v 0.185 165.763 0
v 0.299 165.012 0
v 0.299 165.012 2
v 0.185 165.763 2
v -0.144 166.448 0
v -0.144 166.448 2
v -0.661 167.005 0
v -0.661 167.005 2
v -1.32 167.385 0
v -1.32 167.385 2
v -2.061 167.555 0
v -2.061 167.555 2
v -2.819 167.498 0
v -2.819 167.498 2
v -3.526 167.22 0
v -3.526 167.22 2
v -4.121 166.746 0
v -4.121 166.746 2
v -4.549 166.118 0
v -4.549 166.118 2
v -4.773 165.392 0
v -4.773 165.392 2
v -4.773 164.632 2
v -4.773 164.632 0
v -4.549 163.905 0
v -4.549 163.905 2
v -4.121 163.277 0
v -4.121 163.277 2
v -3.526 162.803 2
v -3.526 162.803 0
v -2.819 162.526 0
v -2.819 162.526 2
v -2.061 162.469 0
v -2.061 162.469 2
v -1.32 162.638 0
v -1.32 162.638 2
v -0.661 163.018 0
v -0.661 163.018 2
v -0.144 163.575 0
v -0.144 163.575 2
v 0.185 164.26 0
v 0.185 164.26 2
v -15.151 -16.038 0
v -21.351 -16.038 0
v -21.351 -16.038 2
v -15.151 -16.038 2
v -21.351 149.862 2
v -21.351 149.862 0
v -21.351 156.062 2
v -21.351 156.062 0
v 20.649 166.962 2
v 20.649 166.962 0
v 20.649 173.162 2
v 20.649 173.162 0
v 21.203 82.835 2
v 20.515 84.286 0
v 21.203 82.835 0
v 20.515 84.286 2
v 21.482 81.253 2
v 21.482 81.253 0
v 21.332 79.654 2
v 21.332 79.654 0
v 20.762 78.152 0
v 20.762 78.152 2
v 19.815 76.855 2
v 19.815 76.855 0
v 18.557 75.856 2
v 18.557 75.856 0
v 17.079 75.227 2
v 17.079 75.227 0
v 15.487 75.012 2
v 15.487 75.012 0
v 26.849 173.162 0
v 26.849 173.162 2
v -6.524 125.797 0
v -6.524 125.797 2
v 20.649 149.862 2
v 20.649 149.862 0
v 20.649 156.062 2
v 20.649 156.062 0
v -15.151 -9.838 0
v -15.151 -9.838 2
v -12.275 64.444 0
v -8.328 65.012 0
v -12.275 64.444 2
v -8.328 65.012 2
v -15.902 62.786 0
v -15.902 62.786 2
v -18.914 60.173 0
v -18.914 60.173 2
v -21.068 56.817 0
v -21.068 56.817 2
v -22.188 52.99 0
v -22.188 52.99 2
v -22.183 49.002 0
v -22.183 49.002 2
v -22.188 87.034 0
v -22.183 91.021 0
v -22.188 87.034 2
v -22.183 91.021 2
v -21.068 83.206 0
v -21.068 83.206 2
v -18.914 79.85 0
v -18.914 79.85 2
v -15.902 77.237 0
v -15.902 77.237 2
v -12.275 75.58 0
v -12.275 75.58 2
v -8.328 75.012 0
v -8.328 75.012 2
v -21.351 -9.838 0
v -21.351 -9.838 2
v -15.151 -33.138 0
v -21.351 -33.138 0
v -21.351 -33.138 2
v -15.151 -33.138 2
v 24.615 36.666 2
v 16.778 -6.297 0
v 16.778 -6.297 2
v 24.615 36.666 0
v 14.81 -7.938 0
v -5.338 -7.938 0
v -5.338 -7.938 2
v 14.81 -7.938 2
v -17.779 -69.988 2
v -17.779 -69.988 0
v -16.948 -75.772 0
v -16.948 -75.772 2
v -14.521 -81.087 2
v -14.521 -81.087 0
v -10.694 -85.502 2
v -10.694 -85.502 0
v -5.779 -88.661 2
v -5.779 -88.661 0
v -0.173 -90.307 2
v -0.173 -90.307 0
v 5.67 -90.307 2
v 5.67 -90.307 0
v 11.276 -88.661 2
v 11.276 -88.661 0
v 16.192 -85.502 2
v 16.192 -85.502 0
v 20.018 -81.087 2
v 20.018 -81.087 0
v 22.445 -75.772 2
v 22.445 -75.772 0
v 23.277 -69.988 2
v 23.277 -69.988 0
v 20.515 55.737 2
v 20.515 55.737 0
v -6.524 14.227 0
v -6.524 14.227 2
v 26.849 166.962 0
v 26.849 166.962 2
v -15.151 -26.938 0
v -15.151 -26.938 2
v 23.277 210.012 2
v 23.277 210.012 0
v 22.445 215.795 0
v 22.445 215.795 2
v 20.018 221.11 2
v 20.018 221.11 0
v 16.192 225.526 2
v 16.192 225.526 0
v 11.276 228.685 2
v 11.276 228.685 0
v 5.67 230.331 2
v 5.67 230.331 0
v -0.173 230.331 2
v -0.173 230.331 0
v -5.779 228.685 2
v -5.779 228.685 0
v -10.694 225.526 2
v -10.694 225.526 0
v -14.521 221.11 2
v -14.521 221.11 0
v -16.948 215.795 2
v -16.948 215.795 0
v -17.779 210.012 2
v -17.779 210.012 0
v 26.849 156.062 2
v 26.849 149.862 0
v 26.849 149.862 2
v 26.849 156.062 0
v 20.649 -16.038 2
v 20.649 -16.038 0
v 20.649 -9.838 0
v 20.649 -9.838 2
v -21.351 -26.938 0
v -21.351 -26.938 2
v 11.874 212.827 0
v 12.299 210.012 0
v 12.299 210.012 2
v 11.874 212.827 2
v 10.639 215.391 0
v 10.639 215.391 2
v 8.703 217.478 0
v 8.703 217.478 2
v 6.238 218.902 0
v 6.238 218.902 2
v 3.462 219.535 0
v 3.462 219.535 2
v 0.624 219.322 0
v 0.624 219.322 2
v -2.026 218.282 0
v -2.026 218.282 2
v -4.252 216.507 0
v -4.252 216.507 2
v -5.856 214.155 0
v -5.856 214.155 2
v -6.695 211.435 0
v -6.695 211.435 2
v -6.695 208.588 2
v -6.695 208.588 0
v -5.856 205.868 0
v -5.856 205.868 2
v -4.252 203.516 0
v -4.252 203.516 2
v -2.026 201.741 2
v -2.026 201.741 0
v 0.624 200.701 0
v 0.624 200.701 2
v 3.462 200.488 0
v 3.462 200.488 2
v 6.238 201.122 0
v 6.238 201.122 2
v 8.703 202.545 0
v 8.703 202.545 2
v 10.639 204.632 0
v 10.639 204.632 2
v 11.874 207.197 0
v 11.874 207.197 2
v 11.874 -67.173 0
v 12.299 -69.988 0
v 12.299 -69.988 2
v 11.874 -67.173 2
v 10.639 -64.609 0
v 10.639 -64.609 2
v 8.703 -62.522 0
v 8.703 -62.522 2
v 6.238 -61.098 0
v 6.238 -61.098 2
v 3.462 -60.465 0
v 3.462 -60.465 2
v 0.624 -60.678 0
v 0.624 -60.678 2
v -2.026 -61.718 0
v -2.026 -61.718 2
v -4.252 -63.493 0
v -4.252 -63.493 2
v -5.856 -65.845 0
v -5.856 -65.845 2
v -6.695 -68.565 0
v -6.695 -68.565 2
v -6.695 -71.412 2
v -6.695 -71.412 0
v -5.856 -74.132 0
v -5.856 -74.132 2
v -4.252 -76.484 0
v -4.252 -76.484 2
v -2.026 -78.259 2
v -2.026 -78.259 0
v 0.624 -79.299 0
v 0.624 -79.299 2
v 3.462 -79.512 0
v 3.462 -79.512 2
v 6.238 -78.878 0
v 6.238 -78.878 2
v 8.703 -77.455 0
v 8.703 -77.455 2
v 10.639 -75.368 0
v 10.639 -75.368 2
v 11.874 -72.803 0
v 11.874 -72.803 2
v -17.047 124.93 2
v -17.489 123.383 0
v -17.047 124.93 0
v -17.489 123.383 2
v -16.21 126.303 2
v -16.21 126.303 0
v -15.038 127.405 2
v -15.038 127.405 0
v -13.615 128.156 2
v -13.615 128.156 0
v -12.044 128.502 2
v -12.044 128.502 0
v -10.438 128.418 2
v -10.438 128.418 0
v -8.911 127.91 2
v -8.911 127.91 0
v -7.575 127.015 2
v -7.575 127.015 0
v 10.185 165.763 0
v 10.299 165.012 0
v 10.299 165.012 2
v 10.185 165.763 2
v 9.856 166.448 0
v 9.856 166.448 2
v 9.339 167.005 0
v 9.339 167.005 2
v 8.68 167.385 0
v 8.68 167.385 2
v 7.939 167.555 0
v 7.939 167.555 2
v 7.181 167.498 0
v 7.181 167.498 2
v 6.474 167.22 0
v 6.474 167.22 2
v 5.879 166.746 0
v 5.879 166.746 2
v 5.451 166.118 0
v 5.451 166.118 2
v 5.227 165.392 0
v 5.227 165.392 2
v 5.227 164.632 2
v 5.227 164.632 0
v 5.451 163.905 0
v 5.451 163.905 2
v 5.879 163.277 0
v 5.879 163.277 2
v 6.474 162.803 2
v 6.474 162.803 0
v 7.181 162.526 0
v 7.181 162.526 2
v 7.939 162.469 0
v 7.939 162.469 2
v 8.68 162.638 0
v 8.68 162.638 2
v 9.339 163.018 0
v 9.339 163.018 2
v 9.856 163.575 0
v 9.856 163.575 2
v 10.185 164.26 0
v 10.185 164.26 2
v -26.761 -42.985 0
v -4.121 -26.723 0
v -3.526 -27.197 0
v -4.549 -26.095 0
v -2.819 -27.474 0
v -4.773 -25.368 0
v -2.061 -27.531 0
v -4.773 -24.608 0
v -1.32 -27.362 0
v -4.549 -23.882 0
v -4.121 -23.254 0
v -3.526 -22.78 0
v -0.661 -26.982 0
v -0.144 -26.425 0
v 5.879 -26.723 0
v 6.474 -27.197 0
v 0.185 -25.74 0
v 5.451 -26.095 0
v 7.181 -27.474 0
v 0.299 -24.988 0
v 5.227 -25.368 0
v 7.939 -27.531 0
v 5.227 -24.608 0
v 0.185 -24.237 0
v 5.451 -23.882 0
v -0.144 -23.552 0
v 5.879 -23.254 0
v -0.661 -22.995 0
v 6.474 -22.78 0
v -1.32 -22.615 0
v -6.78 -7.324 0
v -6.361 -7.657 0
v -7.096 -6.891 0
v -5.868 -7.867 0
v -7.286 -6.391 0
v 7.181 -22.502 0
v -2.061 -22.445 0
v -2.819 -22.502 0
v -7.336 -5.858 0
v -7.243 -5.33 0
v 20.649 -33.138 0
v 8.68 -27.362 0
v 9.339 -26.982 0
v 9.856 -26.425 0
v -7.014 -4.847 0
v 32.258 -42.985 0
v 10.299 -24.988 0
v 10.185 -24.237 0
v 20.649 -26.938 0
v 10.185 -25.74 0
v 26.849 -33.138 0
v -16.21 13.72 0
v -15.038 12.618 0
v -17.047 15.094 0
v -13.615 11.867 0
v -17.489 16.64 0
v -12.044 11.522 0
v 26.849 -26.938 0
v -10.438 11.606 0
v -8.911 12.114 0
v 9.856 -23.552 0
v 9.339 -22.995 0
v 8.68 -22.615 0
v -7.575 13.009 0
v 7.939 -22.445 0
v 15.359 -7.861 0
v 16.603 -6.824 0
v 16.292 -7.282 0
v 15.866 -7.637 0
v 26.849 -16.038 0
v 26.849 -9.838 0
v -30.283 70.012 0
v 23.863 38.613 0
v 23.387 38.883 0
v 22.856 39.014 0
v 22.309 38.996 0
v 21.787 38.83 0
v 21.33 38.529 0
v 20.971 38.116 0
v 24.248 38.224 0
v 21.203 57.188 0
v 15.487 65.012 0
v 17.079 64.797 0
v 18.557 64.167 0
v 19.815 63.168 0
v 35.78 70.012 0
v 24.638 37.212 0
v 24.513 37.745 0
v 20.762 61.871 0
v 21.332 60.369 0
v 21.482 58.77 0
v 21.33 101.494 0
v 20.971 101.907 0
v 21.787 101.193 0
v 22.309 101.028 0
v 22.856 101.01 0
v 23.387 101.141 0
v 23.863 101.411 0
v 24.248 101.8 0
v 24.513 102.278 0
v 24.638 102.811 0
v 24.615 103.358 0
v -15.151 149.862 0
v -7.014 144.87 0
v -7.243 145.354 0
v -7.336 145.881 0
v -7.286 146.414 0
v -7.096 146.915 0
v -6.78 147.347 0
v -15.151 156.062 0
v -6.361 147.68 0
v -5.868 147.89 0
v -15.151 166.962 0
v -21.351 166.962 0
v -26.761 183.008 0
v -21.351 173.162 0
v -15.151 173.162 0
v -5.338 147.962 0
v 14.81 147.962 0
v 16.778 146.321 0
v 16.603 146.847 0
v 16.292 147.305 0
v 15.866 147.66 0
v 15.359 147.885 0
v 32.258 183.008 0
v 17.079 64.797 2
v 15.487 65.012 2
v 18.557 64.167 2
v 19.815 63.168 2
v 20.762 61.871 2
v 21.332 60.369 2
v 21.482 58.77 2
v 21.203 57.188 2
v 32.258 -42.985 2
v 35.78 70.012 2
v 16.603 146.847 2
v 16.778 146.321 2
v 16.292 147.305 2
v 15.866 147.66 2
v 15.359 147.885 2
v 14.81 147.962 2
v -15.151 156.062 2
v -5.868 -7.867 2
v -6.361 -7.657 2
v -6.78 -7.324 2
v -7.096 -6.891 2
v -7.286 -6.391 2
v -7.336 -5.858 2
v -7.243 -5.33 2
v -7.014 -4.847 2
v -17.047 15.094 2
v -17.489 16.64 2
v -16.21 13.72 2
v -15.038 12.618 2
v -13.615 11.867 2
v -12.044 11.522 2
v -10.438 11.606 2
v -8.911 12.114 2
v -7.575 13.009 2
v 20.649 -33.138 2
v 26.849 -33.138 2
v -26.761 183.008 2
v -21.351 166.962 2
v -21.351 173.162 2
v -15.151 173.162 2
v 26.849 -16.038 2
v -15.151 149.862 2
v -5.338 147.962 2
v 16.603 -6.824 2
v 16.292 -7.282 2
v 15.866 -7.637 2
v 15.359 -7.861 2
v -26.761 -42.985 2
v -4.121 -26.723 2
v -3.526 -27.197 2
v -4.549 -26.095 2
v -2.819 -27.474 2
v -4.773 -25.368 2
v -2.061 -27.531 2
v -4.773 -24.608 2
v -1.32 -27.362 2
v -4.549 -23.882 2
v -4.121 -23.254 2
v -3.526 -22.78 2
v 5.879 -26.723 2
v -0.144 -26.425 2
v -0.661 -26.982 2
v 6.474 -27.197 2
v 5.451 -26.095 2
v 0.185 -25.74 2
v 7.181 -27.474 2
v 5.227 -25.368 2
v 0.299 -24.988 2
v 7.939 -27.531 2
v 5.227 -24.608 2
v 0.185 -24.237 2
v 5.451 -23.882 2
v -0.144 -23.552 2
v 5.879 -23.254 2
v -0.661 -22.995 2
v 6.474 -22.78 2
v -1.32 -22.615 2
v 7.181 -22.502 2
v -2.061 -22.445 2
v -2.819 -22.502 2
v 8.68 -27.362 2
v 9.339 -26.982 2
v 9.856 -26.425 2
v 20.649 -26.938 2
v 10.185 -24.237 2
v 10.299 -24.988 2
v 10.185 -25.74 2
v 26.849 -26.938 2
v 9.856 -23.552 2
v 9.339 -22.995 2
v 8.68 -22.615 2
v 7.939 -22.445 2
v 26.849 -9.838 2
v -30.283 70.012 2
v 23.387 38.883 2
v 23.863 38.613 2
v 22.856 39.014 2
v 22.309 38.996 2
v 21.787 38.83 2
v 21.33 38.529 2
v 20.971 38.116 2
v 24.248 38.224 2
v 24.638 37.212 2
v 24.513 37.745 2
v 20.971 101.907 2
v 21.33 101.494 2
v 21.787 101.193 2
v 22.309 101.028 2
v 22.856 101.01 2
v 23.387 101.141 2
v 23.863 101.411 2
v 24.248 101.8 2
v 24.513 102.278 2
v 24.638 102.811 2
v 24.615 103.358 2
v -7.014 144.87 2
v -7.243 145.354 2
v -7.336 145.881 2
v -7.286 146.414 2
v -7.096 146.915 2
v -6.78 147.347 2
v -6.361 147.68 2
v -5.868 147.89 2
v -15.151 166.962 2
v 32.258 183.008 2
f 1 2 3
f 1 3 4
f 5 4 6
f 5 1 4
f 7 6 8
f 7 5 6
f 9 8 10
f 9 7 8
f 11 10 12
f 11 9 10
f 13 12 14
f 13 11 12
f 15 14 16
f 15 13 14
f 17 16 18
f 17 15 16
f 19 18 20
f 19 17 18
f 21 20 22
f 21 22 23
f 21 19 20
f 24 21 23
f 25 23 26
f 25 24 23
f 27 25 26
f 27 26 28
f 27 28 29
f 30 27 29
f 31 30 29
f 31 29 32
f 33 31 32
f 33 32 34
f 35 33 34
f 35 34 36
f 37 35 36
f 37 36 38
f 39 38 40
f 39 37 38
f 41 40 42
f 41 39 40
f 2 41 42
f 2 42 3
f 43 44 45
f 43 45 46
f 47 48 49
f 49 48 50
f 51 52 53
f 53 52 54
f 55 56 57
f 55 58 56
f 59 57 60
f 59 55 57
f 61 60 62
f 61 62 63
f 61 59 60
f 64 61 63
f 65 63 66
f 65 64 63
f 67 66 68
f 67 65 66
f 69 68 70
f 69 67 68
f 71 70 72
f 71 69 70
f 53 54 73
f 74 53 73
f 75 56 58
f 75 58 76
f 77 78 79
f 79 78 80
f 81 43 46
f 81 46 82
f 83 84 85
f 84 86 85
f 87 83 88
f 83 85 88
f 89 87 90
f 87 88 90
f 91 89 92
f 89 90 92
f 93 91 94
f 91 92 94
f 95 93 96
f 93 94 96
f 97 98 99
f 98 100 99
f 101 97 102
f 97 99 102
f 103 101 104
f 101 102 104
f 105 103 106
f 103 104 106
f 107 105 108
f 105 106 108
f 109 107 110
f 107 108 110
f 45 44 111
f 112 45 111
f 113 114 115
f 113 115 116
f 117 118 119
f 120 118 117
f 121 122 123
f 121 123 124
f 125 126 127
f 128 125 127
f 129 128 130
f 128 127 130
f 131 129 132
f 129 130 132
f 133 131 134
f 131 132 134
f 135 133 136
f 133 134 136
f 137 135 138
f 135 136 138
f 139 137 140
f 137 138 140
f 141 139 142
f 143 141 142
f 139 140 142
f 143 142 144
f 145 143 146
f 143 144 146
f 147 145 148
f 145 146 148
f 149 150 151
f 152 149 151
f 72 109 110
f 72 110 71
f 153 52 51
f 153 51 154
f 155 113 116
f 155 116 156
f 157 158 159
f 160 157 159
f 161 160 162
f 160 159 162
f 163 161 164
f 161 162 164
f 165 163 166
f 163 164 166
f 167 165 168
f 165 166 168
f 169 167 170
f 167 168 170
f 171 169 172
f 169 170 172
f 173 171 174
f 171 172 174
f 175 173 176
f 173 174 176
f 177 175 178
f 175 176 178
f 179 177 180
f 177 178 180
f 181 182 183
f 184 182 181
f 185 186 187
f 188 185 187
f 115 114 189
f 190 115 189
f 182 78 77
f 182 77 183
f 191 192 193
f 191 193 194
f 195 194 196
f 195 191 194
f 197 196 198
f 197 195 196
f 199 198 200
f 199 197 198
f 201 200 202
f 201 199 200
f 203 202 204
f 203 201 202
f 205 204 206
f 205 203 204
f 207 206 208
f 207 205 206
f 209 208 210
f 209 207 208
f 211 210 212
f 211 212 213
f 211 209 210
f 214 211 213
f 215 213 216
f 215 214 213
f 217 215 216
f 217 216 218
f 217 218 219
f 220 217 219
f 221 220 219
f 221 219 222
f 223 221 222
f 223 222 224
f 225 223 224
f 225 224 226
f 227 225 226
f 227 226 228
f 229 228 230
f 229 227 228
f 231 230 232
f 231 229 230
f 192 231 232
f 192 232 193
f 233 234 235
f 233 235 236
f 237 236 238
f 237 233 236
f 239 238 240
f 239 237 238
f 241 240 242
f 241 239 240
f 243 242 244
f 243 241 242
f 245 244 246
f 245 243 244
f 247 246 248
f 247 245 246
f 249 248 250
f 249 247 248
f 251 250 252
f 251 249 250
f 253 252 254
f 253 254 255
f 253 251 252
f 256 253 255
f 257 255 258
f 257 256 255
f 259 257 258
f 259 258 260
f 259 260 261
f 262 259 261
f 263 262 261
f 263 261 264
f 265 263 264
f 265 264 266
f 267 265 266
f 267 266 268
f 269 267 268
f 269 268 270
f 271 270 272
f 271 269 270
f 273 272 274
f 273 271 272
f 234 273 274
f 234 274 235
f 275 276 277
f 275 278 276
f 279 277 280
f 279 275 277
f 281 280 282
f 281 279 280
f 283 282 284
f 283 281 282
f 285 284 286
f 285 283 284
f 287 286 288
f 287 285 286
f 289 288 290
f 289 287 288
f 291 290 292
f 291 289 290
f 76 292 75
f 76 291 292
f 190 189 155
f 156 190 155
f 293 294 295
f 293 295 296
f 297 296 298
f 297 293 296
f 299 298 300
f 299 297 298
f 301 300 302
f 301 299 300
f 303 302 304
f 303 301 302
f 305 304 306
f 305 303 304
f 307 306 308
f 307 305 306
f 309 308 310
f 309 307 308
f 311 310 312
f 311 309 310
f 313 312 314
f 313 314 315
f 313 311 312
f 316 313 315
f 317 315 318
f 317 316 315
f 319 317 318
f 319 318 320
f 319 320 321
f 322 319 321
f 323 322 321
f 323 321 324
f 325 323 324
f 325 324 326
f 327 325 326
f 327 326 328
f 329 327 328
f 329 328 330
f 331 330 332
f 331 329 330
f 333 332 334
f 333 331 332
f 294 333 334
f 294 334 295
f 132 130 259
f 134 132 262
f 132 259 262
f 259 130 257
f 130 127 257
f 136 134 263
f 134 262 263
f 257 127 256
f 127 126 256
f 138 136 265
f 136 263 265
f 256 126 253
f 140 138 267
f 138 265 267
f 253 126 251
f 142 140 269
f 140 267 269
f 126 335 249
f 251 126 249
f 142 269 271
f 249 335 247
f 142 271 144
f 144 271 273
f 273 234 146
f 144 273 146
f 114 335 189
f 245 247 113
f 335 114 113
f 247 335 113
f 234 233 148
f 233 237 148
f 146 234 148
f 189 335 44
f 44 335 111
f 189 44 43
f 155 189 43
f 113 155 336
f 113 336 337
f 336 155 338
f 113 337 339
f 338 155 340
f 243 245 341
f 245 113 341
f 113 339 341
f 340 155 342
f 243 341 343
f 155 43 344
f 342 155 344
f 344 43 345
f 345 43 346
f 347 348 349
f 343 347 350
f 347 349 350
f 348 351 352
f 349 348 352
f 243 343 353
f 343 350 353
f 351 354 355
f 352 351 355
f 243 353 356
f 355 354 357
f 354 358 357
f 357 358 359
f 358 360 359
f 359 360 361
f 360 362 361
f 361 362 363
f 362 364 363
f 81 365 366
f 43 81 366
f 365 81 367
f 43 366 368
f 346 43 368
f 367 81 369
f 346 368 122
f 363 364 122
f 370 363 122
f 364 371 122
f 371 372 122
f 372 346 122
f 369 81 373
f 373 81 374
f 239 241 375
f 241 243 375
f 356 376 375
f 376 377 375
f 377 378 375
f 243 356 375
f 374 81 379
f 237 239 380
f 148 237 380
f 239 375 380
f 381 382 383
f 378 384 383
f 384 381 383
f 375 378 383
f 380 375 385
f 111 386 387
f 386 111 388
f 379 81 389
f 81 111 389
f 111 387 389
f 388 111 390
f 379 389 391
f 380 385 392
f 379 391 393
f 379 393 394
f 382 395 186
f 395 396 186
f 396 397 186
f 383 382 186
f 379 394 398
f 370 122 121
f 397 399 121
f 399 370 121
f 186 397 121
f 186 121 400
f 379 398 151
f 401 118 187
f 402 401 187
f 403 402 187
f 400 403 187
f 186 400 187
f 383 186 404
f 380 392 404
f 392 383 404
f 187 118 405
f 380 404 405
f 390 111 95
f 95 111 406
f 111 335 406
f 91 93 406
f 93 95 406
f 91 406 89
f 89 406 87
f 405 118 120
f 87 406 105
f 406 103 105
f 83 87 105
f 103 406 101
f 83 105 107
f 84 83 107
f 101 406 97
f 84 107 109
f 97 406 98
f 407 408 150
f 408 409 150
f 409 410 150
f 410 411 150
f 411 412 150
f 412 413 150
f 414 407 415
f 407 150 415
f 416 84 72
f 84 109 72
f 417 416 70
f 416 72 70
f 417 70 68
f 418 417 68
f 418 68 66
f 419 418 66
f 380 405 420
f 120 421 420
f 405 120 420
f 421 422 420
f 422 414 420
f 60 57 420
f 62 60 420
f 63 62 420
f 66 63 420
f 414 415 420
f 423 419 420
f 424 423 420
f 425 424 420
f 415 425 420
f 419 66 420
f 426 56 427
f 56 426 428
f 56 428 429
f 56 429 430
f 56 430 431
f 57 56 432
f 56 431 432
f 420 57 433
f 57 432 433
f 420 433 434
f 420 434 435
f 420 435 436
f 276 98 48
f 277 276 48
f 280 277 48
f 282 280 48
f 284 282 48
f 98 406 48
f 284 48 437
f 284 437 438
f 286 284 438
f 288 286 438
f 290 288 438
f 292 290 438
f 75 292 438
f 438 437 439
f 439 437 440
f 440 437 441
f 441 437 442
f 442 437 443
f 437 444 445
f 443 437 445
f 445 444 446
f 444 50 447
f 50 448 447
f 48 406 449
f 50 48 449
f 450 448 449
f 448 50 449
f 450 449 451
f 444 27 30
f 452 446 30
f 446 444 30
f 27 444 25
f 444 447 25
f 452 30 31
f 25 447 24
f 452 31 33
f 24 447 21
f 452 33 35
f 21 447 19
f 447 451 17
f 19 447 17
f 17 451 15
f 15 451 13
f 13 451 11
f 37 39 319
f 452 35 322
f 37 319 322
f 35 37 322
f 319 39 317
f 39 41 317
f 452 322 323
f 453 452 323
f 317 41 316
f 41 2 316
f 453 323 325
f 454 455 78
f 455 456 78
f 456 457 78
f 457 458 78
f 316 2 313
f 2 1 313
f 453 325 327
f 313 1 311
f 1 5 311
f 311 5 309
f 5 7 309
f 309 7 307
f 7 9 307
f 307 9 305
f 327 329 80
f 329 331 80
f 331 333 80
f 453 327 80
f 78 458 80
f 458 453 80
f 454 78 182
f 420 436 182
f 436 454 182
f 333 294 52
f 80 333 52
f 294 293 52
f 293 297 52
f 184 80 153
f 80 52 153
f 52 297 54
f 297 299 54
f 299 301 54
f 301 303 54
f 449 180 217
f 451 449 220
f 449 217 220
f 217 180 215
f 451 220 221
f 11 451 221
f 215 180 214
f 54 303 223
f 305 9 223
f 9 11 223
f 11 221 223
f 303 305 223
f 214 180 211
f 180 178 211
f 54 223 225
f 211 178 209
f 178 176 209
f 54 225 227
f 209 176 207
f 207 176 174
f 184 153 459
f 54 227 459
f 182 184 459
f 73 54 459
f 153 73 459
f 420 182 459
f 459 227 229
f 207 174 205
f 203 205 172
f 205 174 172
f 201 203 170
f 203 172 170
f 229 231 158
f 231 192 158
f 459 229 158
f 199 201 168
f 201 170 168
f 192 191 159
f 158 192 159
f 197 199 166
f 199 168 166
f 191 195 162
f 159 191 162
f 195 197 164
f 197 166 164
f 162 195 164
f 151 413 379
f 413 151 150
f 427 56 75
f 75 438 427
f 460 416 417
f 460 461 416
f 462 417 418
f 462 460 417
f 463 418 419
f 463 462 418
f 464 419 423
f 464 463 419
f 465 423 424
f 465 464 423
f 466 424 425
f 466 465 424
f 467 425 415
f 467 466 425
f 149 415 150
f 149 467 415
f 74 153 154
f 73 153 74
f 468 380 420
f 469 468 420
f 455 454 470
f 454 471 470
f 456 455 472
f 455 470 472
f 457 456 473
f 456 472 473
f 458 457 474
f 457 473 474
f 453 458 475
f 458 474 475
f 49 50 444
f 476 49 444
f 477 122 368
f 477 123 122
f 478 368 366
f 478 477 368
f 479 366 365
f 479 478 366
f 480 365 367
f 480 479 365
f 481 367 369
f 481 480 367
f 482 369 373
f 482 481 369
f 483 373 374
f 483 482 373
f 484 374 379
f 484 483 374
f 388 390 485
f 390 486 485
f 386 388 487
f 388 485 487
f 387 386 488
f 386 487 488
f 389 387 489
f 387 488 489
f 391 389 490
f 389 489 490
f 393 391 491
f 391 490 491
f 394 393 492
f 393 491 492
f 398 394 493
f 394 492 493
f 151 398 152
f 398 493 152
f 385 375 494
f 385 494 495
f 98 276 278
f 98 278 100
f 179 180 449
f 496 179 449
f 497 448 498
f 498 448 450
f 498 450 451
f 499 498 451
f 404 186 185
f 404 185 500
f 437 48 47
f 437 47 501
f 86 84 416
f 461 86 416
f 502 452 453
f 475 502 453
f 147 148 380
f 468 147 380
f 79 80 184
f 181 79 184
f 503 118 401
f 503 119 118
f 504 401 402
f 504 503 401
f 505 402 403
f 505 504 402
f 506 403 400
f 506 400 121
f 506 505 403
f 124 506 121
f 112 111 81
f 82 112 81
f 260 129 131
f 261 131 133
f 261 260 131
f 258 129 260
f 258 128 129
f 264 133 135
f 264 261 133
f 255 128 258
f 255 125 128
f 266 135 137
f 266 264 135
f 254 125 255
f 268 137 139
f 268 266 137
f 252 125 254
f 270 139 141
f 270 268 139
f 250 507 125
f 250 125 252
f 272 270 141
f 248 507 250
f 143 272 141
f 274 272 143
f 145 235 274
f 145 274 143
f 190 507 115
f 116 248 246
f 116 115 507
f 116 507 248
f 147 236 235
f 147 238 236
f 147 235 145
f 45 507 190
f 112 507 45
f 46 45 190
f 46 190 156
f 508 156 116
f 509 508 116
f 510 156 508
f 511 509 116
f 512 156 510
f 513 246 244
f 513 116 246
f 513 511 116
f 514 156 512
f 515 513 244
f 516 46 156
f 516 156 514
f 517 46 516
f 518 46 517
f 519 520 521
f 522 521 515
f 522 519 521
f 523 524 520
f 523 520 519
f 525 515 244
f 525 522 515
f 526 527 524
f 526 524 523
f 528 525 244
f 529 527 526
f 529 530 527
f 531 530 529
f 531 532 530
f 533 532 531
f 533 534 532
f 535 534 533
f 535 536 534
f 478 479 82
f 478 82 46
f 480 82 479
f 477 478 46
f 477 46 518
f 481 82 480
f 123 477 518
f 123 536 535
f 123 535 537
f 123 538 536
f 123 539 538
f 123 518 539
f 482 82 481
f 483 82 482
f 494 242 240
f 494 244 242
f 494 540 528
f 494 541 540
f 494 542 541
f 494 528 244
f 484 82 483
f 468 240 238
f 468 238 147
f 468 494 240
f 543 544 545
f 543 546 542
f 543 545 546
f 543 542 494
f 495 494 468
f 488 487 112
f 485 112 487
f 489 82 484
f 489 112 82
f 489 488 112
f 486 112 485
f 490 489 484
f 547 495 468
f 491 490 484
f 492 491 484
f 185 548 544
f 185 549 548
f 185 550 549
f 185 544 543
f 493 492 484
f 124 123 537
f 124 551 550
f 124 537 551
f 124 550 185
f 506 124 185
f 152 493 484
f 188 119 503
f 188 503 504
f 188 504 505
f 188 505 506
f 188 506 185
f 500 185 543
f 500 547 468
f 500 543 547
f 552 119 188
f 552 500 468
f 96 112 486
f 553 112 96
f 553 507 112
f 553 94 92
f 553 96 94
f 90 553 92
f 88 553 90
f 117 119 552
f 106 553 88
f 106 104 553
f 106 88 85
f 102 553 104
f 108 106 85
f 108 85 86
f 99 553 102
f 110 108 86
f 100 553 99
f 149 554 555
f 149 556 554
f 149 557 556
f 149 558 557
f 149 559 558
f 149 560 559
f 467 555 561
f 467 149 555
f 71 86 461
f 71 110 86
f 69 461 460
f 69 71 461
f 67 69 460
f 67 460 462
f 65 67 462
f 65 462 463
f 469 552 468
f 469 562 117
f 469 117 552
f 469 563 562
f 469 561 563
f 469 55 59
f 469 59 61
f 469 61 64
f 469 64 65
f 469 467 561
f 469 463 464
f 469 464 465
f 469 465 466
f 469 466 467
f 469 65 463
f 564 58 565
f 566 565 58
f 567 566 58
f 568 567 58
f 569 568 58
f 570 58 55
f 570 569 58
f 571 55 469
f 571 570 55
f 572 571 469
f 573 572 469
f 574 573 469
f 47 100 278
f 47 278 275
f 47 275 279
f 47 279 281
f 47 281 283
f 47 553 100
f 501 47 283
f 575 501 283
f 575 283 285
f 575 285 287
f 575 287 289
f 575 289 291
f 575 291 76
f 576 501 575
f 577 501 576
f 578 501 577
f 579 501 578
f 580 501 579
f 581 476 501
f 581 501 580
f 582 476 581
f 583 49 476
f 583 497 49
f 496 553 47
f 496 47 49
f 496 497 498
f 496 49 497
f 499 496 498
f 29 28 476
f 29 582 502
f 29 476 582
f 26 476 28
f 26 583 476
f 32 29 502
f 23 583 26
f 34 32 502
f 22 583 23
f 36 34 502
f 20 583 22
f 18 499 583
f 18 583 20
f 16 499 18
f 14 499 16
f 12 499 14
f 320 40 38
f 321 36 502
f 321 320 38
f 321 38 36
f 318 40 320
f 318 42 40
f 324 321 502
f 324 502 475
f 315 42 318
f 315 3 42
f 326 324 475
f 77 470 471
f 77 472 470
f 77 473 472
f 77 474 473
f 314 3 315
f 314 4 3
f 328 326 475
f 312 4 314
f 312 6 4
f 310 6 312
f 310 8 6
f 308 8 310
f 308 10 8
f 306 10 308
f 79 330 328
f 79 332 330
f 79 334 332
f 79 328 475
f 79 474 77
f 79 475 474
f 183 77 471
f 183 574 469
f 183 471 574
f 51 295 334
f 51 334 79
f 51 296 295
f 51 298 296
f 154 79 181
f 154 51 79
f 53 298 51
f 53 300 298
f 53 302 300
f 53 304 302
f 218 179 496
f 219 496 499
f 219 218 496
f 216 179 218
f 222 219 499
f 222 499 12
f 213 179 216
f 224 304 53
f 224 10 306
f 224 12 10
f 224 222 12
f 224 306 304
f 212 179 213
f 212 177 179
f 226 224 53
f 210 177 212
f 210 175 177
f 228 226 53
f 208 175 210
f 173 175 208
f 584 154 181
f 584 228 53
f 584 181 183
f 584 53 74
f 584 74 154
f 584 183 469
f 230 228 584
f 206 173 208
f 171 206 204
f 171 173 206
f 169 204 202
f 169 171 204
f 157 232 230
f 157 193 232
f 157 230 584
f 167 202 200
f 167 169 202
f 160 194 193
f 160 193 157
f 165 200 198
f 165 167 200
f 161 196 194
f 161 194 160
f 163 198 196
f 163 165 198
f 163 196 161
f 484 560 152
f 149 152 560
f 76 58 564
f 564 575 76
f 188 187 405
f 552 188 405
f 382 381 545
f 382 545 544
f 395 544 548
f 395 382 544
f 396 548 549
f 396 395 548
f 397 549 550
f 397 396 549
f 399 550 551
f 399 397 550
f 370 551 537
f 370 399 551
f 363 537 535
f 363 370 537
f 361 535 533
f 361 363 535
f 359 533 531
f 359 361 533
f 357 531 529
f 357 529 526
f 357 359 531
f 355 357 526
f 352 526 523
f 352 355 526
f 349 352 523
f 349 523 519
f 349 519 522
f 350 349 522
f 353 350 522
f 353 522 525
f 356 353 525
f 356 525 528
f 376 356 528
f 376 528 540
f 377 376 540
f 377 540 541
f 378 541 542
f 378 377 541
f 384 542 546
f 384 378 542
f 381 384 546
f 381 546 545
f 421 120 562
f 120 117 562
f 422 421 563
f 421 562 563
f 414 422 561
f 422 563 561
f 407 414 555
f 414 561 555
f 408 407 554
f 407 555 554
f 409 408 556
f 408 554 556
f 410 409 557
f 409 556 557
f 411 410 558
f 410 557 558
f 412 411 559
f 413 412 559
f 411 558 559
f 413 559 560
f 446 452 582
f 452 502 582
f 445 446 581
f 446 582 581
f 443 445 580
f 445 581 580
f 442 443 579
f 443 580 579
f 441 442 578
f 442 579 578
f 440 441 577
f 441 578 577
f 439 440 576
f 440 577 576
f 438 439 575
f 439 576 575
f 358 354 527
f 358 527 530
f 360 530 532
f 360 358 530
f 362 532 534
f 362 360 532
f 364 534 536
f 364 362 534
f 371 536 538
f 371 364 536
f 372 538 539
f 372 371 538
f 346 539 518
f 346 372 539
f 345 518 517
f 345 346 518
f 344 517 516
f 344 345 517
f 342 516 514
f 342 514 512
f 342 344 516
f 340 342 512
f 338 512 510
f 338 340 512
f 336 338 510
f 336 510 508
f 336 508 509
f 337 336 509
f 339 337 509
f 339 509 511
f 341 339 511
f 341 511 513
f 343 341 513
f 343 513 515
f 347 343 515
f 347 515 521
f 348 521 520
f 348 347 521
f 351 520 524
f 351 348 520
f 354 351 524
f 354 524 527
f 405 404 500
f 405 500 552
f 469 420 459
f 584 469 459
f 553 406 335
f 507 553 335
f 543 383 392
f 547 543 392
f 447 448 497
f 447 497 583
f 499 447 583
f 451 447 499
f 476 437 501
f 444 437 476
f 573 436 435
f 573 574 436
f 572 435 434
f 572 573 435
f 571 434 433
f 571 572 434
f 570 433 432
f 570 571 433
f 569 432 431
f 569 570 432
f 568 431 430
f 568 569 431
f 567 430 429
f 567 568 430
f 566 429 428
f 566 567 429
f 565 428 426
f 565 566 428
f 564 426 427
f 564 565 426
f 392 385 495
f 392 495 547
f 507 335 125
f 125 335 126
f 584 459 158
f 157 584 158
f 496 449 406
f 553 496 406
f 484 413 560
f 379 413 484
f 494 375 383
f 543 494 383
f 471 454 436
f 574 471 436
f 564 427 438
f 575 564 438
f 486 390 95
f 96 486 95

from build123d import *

# Parameters (mm, degrees)
SKETCH_1_R      = 9.55
SKETCH_1_R_2    = 2.55
SKETCH_1_W      = 6.2
SKETCH_1_H      = 6.2
EXTRUDE_2_DEPTH = 2
FILLET_1_R      = 6
FILLET_2_R      = 14
FILLET_3_R      = 2


with BuildPart() as part:
    # 草图1 → 凸台-拉伸2 (new body)
    with BuildSketch(Plane.XY):
        with BuildLine():
            Line((-17.779440223, 210.011697354), (-26.761097666, 183.008415033))
            Line((-26.761097666, 183.008415033), (-30.283015797, 70.011697354))
            Line((-30.283015797, 70.011697354), (-26.761097666, -42.985020326))
            Line((-26.761097666, -42.985020326), (-17.779440223, -69.988302646))
            ThreePointArc((-17.779440223, -69.988302646), (2.748608262, -90.516351131), (23.276656746, -69.988302646))
            Line((23.276656746, -69.988302646), (32.258314189, -42.985020326))
            Line((32.258314189, -42.985020326), (35.78023232, 70.011697354))
            Line((35.78023232, 70.011697354), (32.258314189, 183.008415033))
            Line((32.258314189, 183.008415033), (23.276656746, 210.011697354))
            ThreePointArc((23.276656746, 210.011697354), (2.748608262, 230.539745838), (-17.779440223, 210.011697354))
        make_face()
        with Locations((2.748608262, 210.011697354)):
            Circle(SKETCH_1_R, mode=Mode.SUBTRACT)
        with Locations((-2.251391738, 165.011697354)):
            Circle(SKETCH_1_R_2, mode=Mode.SUBTRACT)
        with Locations((7.748608262, 165.011697354)):
            Circle(SKETCH_1_R_2, mode=Mode.SUBTRACT)
        with Locations((7.748608262, -24.988302646)):
            Circle(SKETCH_1_R_2, mode=Mode.SUBTRACT)
        with Locations((-2.251391738, -24.988302646)):
            Circle(SKETCH_1_R_2, mode=Mode.SUBTRACT)
        with Locations((2.748608262, -69.988302646)):
            Circle(SKETCH_1_R, mode=Mode.SUBTRACT)
        with Locations((-18.251391738, 152.961697354)):
            Rectangle(SKETCH_1_W, SKETCH_1_H, mode=Mode.SUBTRACT)
        with Locations((-18.251391738, 170.061697354)):
            Rectangle(SKETCH_1_W, SKETCH_1_H, mode=Mode.SUBTRACT)
        Polygon((26.399526511, 93.573959612), (-9.02733062, 147.961697354), (16.478190756, 147.961697354), align=None, mode=Mode.SUBTRACT)
        Polygon((-15.205972232, 139.125442928), (-24.505459679, 75.011697354), (26.556171202, 75.011697354), align=None, mode=Mode.SUBTRACT)
        with Locations((23.748608262, 152.961697354)):
            Rectangle(SKETCH_1_W, SKETCH_1_H, mode=Mode.SUBTRACT)
        with Locations((23.748608262, 170.061697354)):
            Rectangle(SKETCH_1_W, SKETCH_1_H, mode=Mode.SUBTRACT)
        with Locations((23.748608262, -30.038302646)):
            Rectangle(SKETCH_1_W, SKETCH_1_H, mode=Mode.SUBTRACT)
        with Locations((23.748608262, -12.938302646)):
            Rectangle(SKETCH_1_W, SKETCH_1_H, mode=Mode.SUBTRACT)
        with Locations((-18.251391738, -12.938302646)):
            Rectangle(SKETCH_1_W, SKETCH_1_H, mode=Mode.SUBTRACT)
        Polygon((26.556171202, 65.011697354), (-15.205972232, 0.897951779), (-24.505459679, 65.011697354), align=None, mode=Mode.SUBTRACT)
        Polygon((16.478190756, -7.938302646), (26.399526511, 46.449435095), (-9.02733062, -7.938302646), align=None, mode=Mode.SUBTRACT)
        with Locations((-18.251391738, -30.038302646)):
            Rectangle(SKETCH_1_W, SKETCH_1_H, mode=Mode.SUBTRACT)
    extrude(amount=EXTRUDE_2_DEPTH)

    # 圆角1
    fillet_1_edges = [part.edges().sort_by_distance(p)[0] for p in [
        (-15.205972232, 139.125442928, 1),
        (26.556171202, 75.011697354, 1),
        (26.556171202, 65.011697354, 1),
        (-15.205972232, 0.897951779, 1),
    ]]
    fillet(fillet_1_edges, radius=FILLET_1_R)

    # 圆角2
    fillet_2_edges = [part.edges().sort_by_distance(p)[0] for p in [
        (-24.505459679, 75.011697354, 1),
        (-24.505459679, 65.011697354, 1),
    ]]
    fillet(fillet_2_edges, radius=FILLET_2_R)

    # 圆角3
    fillet_3_edges = [part.edges().sort_by_distance(p)[0] for p in [
        (-9.02733062, -7.938302646, 1),
        (16.478190756, -7.938302646, 1),
        (26.399526511, 46.449435095, 1),
        (-9.02733062, 147.961697354, 1),
        (26.399526511, 93.573959612, 1),
        (16.478190756, 147.961697354, 1),
    ]]
    fillet(fillet_3_edges, radius=FILLET_3_R)


solid = part.part
